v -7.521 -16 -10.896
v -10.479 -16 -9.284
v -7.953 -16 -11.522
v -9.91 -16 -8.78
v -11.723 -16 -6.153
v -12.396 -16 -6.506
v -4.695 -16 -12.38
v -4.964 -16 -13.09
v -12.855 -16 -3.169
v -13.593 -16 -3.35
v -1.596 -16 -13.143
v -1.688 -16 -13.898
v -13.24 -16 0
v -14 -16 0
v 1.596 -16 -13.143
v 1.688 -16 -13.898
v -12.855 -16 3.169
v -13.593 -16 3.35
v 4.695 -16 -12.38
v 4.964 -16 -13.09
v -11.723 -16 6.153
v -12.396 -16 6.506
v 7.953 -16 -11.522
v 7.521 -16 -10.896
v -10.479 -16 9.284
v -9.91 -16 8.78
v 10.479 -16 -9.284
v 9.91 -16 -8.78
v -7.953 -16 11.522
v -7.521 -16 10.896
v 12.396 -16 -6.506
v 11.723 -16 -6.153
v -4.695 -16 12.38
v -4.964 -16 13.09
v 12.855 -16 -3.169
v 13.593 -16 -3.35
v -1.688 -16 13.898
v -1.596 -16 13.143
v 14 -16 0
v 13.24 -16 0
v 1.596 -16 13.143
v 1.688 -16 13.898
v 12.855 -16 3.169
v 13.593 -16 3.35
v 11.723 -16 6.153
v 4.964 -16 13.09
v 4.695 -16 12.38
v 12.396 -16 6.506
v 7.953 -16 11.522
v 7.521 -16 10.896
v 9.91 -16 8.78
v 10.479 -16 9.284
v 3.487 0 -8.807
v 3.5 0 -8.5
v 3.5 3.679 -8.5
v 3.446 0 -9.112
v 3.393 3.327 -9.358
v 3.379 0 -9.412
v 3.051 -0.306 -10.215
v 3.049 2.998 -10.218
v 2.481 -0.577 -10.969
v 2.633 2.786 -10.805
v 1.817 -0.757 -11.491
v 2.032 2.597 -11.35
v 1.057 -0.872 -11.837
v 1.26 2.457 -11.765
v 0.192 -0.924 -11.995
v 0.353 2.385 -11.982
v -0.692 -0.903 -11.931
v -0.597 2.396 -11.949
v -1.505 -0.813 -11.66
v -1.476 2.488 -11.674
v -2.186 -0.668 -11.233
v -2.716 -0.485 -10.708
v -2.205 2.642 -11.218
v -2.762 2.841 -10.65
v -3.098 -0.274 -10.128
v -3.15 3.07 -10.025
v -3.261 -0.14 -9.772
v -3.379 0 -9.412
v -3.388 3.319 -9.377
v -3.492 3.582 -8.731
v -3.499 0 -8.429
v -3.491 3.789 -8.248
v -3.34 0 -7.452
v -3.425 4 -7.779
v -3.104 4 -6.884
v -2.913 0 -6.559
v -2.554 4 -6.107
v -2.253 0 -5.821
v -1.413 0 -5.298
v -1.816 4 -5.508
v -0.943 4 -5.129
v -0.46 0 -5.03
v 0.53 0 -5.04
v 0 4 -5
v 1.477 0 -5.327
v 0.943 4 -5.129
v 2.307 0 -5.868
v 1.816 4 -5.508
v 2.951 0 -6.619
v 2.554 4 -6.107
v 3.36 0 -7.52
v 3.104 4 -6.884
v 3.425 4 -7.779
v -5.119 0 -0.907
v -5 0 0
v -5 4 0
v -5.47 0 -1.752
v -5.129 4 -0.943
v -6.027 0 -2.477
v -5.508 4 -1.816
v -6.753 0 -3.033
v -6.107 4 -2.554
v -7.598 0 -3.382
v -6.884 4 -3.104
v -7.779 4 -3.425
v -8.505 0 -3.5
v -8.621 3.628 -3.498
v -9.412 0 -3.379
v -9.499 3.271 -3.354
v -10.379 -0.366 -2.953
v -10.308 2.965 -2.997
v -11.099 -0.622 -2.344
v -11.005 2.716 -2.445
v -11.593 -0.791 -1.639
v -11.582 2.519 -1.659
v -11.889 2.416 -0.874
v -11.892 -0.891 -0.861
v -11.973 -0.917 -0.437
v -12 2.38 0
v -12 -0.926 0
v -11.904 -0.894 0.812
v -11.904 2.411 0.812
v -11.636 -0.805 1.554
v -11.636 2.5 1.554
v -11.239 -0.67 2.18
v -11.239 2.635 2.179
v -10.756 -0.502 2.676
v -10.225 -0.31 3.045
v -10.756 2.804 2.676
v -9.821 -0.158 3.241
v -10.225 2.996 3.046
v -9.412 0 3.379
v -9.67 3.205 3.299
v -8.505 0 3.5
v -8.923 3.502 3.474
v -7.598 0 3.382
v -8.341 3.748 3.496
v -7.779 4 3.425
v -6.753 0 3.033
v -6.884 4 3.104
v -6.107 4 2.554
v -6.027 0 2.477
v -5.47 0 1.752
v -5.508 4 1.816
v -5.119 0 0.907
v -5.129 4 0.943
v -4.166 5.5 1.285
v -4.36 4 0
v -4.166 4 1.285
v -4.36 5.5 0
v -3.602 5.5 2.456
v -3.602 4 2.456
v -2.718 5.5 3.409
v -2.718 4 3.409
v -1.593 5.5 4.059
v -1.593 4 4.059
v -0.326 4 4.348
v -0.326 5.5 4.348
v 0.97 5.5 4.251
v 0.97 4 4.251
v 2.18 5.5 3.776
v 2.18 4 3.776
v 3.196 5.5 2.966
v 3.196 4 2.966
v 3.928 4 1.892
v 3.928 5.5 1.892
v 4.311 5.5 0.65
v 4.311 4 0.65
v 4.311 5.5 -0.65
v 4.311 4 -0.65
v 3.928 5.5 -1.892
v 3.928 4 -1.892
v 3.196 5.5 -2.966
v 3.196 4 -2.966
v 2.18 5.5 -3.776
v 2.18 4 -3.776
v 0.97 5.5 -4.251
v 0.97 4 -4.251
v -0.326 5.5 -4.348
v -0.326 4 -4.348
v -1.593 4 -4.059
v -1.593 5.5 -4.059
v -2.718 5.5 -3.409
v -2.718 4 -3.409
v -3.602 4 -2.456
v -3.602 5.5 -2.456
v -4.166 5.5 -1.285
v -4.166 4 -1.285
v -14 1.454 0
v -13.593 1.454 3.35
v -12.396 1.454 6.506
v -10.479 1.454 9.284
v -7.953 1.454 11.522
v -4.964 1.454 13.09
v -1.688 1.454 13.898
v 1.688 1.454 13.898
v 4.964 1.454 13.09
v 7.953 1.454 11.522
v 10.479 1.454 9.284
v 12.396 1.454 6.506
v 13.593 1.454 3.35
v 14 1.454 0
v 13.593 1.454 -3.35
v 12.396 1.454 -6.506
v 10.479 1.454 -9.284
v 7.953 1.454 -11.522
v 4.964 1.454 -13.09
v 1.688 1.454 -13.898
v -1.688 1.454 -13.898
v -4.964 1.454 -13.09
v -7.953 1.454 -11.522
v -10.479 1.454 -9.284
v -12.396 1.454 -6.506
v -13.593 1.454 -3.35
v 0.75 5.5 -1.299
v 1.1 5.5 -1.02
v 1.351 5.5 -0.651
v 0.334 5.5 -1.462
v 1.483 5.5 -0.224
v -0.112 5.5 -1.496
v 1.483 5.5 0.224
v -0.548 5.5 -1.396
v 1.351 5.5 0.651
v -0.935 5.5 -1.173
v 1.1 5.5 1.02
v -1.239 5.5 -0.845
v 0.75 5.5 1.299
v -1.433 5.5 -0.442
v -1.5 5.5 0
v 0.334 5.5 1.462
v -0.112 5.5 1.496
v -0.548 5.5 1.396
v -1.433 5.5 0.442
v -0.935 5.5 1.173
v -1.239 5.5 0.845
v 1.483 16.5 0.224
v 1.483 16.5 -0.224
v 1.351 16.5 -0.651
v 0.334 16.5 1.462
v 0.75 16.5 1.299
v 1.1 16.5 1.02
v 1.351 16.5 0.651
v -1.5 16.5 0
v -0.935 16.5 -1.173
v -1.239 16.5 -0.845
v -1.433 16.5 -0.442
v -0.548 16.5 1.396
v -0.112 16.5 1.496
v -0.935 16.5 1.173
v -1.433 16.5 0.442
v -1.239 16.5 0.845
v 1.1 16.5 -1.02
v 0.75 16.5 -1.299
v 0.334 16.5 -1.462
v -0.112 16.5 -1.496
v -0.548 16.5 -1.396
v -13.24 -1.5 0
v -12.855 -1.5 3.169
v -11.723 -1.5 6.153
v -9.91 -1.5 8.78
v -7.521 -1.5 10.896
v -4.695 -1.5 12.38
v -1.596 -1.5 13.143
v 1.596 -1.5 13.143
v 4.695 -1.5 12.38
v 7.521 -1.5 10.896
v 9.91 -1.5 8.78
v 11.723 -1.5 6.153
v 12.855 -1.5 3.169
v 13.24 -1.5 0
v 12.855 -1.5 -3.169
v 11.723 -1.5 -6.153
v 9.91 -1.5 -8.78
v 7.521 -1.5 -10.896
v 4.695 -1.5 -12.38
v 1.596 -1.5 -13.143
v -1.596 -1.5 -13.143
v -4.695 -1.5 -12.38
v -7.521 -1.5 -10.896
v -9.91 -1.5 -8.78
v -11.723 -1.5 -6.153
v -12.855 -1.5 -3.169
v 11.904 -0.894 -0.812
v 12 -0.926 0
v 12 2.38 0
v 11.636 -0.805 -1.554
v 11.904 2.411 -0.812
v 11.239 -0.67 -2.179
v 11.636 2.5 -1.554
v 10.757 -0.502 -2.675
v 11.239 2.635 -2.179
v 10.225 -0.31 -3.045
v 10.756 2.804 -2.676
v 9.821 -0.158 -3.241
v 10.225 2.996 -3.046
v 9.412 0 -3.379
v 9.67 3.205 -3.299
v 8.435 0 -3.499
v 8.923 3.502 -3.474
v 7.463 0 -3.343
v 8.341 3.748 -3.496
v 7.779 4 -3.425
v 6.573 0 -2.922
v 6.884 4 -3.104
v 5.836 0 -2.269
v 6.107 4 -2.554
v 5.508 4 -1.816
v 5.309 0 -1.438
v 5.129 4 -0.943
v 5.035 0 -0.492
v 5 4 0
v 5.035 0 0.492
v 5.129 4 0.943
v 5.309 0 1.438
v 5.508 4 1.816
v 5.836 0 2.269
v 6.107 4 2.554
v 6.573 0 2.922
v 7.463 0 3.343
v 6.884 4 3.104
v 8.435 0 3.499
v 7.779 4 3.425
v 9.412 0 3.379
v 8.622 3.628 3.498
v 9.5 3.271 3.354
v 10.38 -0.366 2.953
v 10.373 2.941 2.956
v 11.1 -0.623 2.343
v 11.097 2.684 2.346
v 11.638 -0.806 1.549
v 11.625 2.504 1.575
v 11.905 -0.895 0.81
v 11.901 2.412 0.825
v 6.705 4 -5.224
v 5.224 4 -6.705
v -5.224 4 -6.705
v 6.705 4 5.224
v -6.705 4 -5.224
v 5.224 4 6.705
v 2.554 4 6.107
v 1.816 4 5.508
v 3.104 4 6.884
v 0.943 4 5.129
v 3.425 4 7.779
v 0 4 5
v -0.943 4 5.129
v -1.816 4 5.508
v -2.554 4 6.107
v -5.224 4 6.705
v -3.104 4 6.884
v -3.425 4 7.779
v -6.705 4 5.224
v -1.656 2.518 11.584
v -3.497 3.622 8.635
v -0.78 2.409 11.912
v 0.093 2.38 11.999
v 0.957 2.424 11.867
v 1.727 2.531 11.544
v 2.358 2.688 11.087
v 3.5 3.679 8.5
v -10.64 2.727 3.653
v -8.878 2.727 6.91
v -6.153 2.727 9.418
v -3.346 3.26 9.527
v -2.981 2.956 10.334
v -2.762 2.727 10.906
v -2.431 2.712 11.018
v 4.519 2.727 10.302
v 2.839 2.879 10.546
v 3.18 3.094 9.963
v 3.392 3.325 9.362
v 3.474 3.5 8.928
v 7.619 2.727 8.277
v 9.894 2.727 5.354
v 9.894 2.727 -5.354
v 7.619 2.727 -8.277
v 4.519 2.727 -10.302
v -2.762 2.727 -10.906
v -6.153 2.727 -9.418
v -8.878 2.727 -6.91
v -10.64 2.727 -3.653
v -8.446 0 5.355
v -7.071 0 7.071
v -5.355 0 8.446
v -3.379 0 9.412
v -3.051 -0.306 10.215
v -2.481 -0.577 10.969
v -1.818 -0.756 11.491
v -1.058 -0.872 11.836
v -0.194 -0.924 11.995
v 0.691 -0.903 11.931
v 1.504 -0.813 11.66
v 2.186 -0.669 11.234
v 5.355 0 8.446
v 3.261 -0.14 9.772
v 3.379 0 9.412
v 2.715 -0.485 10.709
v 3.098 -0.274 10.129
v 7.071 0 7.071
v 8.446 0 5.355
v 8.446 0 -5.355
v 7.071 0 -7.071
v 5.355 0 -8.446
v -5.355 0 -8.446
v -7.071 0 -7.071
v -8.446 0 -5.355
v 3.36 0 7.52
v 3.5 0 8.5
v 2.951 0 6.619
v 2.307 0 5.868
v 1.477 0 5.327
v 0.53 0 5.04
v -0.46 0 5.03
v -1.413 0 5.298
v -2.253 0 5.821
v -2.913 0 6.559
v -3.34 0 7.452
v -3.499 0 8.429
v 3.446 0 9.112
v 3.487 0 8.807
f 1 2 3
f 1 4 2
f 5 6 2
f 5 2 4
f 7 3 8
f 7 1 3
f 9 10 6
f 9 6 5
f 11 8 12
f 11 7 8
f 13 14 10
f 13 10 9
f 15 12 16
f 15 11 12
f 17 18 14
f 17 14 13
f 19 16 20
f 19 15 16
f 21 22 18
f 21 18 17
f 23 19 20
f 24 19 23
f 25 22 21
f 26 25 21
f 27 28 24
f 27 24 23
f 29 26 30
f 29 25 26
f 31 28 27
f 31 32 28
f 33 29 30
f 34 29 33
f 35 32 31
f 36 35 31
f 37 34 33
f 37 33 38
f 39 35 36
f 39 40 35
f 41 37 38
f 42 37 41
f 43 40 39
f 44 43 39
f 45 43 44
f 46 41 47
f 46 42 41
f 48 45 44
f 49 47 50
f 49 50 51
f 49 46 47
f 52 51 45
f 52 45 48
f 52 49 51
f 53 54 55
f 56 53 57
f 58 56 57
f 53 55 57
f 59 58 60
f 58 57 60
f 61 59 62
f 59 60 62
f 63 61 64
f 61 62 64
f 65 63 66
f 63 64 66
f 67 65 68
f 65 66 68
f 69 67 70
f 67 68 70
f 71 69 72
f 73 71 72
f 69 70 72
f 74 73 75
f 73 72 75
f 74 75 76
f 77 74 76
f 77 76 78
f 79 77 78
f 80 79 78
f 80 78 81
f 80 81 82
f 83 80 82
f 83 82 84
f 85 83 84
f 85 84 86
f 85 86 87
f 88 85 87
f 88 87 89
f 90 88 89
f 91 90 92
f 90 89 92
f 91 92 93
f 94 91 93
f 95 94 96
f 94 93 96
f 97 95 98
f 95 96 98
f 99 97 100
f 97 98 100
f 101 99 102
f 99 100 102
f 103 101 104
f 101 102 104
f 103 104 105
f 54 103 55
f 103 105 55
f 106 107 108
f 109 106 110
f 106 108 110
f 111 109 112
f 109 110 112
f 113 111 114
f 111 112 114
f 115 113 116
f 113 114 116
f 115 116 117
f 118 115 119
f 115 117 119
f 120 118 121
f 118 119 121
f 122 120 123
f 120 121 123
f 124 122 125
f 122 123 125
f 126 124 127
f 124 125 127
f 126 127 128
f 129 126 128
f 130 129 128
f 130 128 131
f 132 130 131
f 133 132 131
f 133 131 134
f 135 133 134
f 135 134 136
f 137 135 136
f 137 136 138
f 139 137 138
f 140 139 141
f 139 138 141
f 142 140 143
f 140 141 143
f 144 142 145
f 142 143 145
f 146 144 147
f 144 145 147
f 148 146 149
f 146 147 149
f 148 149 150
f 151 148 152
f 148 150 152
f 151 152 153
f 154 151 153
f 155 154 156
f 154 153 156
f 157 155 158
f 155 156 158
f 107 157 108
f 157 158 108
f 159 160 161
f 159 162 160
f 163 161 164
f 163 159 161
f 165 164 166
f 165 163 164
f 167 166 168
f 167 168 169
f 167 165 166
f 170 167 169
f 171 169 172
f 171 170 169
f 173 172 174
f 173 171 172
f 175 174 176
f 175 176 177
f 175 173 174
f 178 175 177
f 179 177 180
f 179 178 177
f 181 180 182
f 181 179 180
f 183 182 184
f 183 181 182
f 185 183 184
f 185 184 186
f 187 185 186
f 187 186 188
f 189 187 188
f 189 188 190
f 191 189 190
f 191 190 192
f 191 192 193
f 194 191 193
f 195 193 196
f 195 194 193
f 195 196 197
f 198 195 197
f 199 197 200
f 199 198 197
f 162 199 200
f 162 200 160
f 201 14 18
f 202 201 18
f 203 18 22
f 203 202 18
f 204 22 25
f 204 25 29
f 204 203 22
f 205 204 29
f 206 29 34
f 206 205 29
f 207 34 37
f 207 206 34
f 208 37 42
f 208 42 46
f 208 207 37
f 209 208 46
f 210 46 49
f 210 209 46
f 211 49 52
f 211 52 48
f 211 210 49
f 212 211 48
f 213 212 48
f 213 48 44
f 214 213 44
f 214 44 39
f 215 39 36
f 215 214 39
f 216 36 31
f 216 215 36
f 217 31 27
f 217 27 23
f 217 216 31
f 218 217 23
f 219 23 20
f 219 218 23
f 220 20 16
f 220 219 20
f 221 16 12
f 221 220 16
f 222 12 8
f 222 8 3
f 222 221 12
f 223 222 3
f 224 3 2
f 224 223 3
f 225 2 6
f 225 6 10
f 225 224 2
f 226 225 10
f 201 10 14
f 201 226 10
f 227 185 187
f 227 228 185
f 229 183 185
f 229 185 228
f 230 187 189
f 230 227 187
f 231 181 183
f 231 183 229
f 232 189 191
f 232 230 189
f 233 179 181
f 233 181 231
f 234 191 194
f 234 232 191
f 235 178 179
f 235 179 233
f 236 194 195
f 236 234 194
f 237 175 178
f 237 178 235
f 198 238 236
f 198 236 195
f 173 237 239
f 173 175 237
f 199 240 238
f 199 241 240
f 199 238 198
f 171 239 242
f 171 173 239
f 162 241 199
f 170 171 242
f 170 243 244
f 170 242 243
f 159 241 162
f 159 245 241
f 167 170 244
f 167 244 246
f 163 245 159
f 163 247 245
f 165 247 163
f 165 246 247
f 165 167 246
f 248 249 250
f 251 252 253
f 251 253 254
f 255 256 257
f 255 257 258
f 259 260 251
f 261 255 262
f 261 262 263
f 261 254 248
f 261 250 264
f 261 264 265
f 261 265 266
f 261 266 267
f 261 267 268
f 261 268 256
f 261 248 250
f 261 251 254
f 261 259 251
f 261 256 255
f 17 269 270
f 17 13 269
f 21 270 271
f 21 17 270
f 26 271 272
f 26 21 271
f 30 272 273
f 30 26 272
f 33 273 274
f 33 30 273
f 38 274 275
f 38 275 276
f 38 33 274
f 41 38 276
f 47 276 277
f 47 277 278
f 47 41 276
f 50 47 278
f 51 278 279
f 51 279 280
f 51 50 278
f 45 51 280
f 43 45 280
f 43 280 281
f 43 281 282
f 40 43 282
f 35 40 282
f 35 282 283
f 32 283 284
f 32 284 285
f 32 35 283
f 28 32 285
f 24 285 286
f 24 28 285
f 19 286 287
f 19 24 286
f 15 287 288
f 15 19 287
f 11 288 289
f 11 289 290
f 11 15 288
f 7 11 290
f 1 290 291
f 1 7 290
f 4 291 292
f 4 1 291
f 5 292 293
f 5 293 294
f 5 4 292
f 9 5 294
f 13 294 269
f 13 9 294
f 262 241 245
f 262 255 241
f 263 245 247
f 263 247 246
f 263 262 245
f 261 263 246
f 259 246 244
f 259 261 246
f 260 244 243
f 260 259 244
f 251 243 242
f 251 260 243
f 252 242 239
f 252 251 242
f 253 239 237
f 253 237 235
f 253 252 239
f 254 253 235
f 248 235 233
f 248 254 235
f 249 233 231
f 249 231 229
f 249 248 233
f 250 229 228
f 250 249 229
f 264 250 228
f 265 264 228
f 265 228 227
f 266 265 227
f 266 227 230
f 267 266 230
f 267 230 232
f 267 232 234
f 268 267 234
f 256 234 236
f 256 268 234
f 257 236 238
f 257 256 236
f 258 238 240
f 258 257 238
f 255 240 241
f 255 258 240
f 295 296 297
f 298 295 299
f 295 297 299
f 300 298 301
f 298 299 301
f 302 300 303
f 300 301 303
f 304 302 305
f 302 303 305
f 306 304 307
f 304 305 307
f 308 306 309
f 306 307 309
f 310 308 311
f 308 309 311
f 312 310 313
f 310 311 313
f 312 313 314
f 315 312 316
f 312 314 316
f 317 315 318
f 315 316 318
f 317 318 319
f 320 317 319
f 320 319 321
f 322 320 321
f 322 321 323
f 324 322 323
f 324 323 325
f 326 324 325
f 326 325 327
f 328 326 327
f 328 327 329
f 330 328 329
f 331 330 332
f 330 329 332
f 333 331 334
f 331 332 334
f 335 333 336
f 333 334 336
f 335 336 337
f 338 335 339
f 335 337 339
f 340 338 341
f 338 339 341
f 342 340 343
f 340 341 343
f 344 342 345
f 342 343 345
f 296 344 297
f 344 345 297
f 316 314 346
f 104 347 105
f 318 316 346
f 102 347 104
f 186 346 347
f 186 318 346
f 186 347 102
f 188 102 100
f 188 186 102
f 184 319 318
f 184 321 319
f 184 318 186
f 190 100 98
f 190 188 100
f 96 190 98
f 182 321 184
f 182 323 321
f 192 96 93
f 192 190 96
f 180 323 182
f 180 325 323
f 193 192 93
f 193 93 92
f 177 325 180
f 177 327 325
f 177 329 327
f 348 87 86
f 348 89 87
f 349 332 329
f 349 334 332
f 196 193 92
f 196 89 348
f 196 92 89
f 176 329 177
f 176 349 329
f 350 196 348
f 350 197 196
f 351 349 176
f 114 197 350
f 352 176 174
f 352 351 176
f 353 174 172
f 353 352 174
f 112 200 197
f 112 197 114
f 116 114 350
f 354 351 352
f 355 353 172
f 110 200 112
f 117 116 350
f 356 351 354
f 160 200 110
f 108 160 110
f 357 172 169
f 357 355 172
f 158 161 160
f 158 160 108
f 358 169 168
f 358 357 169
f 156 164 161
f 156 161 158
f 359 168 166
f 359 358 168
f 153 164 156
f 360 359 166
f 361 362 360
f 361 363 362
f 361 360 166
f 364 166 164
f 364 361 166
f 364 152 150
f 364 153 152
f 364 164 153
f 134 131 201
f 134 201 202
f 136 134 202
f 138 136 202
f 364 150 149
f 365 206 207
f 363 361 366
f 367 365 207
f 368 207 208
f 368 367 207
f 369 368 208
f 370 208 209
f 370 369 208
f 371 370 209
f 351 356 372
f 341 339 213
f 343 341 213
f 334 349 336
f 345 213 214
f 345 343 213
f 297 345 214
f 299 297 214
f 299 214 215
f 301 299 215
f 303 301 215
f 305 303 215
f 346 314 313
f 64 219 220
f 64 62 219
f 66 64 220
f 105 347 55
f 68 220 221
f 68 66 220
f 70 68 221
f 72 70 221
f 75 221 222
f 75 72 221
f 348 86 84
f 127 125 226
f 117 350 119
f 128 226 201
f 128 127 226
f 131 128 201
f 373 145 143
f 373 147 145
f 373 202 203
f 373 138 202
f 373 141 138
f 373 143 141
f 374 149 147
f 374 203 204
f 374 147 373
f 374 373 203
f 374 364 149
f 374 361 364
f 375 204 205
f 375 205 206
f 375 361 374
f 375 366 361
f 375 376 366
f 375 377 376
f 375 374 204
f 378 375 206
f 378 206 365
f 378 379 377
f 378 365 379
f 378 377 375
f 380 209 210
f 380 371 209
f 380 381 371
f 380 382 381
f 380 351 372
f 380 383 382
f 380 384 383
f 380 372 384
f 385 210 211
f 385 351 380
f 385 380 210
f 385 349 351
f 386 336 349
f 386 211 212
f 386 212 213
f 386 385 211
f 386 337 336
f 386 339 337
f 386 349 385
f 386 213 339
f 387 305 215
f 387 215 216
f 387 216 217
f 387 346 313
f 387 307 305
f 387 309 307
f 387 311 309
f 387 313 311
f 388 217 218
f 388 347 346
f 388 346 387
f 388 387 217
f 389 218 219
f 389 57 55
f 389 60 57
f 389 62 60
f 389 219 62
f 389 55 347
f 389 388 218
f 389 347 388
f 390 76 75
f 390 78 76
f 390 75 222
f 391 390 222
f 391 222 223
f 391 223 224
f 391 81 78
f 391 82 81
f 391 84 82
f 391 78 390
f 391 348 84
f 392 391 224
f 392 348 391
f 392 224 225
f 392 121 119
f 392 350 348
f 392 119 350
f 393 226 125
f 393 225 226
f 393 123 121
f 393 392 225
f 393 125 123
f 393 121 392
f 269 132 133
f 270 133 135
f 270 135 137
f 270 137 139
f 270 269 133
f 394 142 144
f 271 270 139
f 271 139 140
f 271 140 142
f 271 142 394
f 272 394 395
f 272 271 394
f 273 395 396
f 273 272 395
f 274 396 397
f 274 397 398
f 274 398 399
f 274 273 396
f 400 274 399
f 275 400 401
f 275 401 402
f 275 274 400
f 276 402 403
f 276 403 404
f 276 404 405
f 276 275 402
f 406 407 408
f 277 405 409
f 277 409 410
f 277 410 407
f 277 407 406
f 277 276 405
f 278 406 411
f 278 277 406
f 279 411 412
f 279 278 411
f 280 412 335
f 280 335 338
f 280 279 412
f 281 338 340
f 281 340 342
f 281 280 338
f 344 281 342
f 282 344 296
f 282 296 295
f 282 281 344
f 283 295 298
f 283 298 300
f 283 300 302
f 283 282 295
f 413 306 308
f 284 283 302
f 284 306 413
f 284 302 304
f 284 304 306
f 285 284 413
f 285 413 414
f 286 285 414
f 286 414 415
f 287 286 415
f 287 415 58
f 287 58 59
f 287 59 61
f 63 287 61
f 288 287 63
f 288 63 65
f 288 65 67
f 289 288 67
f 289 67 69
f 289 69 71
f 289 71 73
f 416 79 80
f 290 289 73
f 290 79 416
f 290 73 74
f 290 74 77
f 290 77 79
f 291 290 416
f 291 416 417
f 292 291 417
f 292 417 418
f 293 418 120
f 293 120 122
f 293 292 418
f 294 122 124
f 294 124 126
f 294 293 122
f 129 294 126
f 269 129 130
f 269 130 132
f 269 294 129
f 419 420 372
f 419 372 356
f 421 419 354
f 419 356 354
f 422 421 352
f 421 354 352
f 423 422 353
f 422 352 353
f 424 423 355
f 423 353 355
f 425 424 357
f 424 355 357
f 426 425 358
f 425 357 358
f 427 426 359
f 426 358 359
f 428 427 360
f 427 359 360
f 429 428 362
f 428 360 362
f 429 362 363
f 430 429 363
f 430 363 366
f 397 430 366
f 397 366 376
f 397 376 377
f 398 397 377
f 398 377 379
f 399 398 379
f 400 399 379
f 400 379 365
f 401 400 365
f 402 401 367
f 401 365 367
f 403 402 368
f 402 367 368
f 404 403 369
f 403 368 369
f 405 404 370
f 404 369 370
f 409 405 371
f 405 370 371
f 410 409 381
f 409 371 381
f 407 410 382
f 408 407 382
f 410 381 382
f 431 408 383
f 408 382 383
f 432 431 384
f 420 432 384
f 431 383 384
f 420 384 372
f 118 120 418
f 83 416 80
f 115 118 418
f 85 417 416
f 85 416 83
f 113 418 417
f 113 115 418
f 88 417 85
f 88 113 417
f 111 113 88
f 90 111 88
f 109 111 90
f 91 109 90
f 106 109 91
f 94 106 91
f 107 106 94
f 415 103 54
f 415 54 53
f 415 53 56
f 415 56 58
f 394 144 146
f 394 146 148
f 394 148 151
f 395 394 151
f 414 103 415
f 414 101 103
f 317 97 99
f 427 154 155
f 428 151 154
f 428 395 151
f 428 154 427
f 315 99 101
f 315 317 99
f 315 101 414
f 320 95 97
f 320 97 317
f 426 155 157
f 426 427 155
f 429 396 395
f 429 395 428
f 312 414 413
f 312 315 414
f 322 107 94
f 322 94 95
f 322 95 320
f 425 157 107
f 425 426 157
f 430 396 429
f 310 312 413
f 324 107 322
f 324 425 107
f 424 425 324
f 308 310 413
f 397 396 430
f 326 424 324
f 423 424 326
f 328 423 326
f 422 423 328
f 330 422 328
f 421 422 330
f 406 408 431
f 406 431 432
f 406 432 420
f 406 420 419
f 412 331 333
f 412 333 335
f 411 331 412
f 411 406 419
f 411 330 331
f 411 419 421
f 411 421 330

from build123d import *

# Parameters (mm, degrees)
CROQUIS1_W            = 1.5
CROQUIS1_H            = 11
CROQUIS2_R            = 3.5
CORTAR_EXTRUIR1_DEPTH = 7


with BuildPart() as part:
    # Croquis1 → Revolución1 (revolve)
    with BuildSketch(Plane.XY):
        Polygon((-13.24, -16), (-14, -16), (-14, 1.453703704), (-8.5, 4), (-4.36, 4), (-4.36, 5.5), (0, 5.5), (0, 0), (-10, 0), (-13.24, -1.5), align=None)
        with Locations((-0.75, 11)):
            Rectangle(CROQUIS1_W, CROQUIS1_H)
    revolve(axis=Axis((0, -19.446999562, 0), (0, 1, 0)))

    # Croquis2 → Cortar-Extruir1 (cut)
    with BuildSketch(Plane(origin=(0, 4, 0), x_dir=(1, 0, 0), z_dir=(0, 1, 0))):
        with Locations((0, 8.5)):
            Circle(CROQUIS2_R)
        with Locations((8.5, 0)):
            Circle(CROQUIS2_R)
        with Locations((0, -8.5)):
            Circle(CROQUIS2_R)
        with Locations((-8.5, 0)):
            Circle(CROQUIS2_R)
    extrude(amount=-CORTAR_EXTRUIR1_DEPTH, mode=Mode.SUBTRACT)


solid = part.part
